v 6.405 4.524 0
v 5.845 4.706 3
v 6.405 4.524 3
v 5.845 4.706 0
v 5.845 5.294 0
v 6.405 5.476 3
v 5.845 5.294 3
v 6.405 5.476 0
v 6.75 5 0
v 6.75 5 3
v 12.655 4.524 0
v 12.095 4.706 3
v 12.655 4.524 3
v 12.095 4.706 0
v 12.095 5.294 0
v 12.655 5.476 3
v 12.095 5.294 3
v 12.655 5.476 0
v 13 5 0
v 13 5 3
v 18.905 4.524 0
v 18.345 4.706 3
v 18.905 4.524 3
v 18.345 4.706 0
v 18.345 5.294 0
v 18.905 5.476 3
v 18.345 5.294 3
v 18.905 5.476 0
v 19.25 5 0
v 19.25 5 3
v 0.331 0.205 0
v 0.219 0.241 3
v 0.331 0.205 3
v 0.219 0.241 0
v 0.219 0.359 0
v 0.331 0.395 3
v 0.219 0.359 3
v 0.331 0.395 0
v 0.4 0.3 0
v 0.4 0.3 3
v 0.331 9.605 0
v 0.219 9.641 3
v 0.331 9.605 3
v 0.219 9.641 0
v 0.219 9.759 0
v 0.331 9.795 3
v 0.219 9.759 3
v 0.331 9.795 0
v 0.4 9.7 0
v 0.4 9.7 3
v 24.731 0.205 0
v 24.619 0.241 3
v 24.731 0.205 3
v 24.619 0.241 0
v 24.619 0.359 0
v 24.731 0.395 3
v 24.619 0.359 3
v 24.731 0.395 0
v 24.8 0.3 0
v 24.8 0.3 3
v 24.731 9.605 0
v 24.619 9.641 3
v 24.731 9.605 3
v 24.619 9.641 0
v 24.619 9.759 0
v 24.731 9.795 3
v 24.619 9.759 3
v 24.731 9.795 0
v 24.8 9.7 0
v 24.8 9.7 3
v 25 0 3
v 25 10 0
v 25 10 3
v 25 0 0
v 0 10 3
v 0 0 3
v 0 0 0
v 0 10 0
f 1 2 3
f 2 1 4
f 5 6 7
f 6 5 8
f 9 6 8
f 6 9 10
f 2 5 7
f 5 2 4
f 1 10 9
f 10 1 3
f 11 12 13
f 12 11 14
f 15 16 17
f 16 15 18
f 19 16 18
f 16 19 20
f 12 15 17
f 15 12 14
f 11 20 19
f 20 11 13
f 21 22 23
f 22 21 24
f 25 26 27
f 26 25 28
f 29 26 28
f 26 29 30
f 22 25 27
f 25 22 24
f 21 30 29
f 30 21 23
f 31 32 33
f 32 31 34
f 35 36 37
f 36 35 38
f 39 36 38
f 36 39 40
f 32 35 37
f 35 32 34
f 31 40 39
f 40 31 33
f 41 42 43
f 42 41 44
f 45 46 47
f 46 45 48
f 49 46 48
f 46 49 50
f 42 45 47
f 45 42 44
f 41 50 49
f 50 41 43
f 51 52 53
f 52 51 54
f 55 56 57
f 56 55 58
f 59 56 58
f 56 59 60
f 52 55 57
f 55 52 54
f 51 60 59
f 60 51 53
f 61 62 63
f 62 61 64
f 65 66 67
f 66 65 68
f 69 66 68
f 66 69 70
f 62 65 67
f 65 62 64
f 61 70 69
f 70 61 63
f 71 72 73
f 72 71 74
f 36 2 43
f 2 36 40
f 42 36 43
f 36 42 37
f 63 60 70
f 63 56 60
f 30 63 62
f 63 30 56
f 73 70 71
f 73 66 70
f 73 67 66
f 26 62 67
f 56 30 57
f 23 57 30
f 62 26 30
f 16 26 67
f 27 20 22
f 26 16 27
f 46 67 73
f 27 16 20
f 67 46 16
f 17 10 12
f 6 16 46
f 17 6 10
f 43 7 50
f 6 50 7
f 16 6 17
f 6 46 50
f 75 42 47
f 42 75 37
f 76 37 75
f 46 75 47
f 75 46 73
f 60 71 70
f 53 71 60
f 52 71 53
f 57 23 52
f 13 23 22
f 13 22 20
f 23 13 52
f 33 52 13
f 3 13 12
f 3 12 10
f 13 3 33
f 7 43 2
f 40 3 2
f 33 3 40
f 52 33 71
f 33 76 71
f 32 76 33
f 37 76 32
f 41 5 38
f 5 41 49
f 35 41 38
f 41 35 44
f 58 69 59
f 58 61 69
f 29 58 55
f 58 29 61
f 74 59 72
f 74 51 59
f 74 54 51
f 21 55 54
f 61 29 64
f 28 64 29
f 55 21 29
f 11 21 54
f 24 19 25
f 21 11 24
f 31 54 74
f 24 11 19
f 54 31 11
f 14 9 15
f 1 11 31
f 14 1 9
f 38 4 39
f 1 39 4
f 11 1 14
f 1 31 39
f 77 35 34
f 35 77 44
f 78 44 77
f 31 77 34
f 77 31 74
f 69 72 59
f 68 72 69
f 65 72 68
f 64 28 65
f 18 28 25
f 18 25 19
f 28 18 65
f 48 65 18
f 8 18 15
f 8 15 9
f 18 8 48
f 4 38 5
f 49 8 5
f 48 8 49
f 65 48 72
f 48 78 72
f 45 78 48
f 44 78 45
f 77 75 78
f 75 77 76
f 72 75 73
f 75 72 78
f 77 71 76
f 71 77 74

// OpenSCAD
w=25;           //width of panel
h=10;           //height of panel
t=3;            //thickness of panel
nrswholes=3;    // number of switch holes
mtghole=1;      //set to zero for no mounting holes

function getwidth(n)=n*w/(nrswholes+1);

module panel() {        // main panel
    cube([w,h,t]);
}

module switch(n) {      // switch holes
    translate([getwidth(n),h/2,-.1])
        cylinder(h=2*t,r=.5);
}

module mthole(x,y) {    // mounting holes
    translate([x,y,-.1]) cylinder(h=2*t,r=.1);
}

difference() {
//main panel
    panel();
//switch cut outs
    for (i=[1:nrswholes])
        switch(i);
//mounting holes
    if (mtghole==1) {
        for (i=[.3,w-.3], j=[.3,h-.3]) {
            mthole(i,j);
        }
    }
}
